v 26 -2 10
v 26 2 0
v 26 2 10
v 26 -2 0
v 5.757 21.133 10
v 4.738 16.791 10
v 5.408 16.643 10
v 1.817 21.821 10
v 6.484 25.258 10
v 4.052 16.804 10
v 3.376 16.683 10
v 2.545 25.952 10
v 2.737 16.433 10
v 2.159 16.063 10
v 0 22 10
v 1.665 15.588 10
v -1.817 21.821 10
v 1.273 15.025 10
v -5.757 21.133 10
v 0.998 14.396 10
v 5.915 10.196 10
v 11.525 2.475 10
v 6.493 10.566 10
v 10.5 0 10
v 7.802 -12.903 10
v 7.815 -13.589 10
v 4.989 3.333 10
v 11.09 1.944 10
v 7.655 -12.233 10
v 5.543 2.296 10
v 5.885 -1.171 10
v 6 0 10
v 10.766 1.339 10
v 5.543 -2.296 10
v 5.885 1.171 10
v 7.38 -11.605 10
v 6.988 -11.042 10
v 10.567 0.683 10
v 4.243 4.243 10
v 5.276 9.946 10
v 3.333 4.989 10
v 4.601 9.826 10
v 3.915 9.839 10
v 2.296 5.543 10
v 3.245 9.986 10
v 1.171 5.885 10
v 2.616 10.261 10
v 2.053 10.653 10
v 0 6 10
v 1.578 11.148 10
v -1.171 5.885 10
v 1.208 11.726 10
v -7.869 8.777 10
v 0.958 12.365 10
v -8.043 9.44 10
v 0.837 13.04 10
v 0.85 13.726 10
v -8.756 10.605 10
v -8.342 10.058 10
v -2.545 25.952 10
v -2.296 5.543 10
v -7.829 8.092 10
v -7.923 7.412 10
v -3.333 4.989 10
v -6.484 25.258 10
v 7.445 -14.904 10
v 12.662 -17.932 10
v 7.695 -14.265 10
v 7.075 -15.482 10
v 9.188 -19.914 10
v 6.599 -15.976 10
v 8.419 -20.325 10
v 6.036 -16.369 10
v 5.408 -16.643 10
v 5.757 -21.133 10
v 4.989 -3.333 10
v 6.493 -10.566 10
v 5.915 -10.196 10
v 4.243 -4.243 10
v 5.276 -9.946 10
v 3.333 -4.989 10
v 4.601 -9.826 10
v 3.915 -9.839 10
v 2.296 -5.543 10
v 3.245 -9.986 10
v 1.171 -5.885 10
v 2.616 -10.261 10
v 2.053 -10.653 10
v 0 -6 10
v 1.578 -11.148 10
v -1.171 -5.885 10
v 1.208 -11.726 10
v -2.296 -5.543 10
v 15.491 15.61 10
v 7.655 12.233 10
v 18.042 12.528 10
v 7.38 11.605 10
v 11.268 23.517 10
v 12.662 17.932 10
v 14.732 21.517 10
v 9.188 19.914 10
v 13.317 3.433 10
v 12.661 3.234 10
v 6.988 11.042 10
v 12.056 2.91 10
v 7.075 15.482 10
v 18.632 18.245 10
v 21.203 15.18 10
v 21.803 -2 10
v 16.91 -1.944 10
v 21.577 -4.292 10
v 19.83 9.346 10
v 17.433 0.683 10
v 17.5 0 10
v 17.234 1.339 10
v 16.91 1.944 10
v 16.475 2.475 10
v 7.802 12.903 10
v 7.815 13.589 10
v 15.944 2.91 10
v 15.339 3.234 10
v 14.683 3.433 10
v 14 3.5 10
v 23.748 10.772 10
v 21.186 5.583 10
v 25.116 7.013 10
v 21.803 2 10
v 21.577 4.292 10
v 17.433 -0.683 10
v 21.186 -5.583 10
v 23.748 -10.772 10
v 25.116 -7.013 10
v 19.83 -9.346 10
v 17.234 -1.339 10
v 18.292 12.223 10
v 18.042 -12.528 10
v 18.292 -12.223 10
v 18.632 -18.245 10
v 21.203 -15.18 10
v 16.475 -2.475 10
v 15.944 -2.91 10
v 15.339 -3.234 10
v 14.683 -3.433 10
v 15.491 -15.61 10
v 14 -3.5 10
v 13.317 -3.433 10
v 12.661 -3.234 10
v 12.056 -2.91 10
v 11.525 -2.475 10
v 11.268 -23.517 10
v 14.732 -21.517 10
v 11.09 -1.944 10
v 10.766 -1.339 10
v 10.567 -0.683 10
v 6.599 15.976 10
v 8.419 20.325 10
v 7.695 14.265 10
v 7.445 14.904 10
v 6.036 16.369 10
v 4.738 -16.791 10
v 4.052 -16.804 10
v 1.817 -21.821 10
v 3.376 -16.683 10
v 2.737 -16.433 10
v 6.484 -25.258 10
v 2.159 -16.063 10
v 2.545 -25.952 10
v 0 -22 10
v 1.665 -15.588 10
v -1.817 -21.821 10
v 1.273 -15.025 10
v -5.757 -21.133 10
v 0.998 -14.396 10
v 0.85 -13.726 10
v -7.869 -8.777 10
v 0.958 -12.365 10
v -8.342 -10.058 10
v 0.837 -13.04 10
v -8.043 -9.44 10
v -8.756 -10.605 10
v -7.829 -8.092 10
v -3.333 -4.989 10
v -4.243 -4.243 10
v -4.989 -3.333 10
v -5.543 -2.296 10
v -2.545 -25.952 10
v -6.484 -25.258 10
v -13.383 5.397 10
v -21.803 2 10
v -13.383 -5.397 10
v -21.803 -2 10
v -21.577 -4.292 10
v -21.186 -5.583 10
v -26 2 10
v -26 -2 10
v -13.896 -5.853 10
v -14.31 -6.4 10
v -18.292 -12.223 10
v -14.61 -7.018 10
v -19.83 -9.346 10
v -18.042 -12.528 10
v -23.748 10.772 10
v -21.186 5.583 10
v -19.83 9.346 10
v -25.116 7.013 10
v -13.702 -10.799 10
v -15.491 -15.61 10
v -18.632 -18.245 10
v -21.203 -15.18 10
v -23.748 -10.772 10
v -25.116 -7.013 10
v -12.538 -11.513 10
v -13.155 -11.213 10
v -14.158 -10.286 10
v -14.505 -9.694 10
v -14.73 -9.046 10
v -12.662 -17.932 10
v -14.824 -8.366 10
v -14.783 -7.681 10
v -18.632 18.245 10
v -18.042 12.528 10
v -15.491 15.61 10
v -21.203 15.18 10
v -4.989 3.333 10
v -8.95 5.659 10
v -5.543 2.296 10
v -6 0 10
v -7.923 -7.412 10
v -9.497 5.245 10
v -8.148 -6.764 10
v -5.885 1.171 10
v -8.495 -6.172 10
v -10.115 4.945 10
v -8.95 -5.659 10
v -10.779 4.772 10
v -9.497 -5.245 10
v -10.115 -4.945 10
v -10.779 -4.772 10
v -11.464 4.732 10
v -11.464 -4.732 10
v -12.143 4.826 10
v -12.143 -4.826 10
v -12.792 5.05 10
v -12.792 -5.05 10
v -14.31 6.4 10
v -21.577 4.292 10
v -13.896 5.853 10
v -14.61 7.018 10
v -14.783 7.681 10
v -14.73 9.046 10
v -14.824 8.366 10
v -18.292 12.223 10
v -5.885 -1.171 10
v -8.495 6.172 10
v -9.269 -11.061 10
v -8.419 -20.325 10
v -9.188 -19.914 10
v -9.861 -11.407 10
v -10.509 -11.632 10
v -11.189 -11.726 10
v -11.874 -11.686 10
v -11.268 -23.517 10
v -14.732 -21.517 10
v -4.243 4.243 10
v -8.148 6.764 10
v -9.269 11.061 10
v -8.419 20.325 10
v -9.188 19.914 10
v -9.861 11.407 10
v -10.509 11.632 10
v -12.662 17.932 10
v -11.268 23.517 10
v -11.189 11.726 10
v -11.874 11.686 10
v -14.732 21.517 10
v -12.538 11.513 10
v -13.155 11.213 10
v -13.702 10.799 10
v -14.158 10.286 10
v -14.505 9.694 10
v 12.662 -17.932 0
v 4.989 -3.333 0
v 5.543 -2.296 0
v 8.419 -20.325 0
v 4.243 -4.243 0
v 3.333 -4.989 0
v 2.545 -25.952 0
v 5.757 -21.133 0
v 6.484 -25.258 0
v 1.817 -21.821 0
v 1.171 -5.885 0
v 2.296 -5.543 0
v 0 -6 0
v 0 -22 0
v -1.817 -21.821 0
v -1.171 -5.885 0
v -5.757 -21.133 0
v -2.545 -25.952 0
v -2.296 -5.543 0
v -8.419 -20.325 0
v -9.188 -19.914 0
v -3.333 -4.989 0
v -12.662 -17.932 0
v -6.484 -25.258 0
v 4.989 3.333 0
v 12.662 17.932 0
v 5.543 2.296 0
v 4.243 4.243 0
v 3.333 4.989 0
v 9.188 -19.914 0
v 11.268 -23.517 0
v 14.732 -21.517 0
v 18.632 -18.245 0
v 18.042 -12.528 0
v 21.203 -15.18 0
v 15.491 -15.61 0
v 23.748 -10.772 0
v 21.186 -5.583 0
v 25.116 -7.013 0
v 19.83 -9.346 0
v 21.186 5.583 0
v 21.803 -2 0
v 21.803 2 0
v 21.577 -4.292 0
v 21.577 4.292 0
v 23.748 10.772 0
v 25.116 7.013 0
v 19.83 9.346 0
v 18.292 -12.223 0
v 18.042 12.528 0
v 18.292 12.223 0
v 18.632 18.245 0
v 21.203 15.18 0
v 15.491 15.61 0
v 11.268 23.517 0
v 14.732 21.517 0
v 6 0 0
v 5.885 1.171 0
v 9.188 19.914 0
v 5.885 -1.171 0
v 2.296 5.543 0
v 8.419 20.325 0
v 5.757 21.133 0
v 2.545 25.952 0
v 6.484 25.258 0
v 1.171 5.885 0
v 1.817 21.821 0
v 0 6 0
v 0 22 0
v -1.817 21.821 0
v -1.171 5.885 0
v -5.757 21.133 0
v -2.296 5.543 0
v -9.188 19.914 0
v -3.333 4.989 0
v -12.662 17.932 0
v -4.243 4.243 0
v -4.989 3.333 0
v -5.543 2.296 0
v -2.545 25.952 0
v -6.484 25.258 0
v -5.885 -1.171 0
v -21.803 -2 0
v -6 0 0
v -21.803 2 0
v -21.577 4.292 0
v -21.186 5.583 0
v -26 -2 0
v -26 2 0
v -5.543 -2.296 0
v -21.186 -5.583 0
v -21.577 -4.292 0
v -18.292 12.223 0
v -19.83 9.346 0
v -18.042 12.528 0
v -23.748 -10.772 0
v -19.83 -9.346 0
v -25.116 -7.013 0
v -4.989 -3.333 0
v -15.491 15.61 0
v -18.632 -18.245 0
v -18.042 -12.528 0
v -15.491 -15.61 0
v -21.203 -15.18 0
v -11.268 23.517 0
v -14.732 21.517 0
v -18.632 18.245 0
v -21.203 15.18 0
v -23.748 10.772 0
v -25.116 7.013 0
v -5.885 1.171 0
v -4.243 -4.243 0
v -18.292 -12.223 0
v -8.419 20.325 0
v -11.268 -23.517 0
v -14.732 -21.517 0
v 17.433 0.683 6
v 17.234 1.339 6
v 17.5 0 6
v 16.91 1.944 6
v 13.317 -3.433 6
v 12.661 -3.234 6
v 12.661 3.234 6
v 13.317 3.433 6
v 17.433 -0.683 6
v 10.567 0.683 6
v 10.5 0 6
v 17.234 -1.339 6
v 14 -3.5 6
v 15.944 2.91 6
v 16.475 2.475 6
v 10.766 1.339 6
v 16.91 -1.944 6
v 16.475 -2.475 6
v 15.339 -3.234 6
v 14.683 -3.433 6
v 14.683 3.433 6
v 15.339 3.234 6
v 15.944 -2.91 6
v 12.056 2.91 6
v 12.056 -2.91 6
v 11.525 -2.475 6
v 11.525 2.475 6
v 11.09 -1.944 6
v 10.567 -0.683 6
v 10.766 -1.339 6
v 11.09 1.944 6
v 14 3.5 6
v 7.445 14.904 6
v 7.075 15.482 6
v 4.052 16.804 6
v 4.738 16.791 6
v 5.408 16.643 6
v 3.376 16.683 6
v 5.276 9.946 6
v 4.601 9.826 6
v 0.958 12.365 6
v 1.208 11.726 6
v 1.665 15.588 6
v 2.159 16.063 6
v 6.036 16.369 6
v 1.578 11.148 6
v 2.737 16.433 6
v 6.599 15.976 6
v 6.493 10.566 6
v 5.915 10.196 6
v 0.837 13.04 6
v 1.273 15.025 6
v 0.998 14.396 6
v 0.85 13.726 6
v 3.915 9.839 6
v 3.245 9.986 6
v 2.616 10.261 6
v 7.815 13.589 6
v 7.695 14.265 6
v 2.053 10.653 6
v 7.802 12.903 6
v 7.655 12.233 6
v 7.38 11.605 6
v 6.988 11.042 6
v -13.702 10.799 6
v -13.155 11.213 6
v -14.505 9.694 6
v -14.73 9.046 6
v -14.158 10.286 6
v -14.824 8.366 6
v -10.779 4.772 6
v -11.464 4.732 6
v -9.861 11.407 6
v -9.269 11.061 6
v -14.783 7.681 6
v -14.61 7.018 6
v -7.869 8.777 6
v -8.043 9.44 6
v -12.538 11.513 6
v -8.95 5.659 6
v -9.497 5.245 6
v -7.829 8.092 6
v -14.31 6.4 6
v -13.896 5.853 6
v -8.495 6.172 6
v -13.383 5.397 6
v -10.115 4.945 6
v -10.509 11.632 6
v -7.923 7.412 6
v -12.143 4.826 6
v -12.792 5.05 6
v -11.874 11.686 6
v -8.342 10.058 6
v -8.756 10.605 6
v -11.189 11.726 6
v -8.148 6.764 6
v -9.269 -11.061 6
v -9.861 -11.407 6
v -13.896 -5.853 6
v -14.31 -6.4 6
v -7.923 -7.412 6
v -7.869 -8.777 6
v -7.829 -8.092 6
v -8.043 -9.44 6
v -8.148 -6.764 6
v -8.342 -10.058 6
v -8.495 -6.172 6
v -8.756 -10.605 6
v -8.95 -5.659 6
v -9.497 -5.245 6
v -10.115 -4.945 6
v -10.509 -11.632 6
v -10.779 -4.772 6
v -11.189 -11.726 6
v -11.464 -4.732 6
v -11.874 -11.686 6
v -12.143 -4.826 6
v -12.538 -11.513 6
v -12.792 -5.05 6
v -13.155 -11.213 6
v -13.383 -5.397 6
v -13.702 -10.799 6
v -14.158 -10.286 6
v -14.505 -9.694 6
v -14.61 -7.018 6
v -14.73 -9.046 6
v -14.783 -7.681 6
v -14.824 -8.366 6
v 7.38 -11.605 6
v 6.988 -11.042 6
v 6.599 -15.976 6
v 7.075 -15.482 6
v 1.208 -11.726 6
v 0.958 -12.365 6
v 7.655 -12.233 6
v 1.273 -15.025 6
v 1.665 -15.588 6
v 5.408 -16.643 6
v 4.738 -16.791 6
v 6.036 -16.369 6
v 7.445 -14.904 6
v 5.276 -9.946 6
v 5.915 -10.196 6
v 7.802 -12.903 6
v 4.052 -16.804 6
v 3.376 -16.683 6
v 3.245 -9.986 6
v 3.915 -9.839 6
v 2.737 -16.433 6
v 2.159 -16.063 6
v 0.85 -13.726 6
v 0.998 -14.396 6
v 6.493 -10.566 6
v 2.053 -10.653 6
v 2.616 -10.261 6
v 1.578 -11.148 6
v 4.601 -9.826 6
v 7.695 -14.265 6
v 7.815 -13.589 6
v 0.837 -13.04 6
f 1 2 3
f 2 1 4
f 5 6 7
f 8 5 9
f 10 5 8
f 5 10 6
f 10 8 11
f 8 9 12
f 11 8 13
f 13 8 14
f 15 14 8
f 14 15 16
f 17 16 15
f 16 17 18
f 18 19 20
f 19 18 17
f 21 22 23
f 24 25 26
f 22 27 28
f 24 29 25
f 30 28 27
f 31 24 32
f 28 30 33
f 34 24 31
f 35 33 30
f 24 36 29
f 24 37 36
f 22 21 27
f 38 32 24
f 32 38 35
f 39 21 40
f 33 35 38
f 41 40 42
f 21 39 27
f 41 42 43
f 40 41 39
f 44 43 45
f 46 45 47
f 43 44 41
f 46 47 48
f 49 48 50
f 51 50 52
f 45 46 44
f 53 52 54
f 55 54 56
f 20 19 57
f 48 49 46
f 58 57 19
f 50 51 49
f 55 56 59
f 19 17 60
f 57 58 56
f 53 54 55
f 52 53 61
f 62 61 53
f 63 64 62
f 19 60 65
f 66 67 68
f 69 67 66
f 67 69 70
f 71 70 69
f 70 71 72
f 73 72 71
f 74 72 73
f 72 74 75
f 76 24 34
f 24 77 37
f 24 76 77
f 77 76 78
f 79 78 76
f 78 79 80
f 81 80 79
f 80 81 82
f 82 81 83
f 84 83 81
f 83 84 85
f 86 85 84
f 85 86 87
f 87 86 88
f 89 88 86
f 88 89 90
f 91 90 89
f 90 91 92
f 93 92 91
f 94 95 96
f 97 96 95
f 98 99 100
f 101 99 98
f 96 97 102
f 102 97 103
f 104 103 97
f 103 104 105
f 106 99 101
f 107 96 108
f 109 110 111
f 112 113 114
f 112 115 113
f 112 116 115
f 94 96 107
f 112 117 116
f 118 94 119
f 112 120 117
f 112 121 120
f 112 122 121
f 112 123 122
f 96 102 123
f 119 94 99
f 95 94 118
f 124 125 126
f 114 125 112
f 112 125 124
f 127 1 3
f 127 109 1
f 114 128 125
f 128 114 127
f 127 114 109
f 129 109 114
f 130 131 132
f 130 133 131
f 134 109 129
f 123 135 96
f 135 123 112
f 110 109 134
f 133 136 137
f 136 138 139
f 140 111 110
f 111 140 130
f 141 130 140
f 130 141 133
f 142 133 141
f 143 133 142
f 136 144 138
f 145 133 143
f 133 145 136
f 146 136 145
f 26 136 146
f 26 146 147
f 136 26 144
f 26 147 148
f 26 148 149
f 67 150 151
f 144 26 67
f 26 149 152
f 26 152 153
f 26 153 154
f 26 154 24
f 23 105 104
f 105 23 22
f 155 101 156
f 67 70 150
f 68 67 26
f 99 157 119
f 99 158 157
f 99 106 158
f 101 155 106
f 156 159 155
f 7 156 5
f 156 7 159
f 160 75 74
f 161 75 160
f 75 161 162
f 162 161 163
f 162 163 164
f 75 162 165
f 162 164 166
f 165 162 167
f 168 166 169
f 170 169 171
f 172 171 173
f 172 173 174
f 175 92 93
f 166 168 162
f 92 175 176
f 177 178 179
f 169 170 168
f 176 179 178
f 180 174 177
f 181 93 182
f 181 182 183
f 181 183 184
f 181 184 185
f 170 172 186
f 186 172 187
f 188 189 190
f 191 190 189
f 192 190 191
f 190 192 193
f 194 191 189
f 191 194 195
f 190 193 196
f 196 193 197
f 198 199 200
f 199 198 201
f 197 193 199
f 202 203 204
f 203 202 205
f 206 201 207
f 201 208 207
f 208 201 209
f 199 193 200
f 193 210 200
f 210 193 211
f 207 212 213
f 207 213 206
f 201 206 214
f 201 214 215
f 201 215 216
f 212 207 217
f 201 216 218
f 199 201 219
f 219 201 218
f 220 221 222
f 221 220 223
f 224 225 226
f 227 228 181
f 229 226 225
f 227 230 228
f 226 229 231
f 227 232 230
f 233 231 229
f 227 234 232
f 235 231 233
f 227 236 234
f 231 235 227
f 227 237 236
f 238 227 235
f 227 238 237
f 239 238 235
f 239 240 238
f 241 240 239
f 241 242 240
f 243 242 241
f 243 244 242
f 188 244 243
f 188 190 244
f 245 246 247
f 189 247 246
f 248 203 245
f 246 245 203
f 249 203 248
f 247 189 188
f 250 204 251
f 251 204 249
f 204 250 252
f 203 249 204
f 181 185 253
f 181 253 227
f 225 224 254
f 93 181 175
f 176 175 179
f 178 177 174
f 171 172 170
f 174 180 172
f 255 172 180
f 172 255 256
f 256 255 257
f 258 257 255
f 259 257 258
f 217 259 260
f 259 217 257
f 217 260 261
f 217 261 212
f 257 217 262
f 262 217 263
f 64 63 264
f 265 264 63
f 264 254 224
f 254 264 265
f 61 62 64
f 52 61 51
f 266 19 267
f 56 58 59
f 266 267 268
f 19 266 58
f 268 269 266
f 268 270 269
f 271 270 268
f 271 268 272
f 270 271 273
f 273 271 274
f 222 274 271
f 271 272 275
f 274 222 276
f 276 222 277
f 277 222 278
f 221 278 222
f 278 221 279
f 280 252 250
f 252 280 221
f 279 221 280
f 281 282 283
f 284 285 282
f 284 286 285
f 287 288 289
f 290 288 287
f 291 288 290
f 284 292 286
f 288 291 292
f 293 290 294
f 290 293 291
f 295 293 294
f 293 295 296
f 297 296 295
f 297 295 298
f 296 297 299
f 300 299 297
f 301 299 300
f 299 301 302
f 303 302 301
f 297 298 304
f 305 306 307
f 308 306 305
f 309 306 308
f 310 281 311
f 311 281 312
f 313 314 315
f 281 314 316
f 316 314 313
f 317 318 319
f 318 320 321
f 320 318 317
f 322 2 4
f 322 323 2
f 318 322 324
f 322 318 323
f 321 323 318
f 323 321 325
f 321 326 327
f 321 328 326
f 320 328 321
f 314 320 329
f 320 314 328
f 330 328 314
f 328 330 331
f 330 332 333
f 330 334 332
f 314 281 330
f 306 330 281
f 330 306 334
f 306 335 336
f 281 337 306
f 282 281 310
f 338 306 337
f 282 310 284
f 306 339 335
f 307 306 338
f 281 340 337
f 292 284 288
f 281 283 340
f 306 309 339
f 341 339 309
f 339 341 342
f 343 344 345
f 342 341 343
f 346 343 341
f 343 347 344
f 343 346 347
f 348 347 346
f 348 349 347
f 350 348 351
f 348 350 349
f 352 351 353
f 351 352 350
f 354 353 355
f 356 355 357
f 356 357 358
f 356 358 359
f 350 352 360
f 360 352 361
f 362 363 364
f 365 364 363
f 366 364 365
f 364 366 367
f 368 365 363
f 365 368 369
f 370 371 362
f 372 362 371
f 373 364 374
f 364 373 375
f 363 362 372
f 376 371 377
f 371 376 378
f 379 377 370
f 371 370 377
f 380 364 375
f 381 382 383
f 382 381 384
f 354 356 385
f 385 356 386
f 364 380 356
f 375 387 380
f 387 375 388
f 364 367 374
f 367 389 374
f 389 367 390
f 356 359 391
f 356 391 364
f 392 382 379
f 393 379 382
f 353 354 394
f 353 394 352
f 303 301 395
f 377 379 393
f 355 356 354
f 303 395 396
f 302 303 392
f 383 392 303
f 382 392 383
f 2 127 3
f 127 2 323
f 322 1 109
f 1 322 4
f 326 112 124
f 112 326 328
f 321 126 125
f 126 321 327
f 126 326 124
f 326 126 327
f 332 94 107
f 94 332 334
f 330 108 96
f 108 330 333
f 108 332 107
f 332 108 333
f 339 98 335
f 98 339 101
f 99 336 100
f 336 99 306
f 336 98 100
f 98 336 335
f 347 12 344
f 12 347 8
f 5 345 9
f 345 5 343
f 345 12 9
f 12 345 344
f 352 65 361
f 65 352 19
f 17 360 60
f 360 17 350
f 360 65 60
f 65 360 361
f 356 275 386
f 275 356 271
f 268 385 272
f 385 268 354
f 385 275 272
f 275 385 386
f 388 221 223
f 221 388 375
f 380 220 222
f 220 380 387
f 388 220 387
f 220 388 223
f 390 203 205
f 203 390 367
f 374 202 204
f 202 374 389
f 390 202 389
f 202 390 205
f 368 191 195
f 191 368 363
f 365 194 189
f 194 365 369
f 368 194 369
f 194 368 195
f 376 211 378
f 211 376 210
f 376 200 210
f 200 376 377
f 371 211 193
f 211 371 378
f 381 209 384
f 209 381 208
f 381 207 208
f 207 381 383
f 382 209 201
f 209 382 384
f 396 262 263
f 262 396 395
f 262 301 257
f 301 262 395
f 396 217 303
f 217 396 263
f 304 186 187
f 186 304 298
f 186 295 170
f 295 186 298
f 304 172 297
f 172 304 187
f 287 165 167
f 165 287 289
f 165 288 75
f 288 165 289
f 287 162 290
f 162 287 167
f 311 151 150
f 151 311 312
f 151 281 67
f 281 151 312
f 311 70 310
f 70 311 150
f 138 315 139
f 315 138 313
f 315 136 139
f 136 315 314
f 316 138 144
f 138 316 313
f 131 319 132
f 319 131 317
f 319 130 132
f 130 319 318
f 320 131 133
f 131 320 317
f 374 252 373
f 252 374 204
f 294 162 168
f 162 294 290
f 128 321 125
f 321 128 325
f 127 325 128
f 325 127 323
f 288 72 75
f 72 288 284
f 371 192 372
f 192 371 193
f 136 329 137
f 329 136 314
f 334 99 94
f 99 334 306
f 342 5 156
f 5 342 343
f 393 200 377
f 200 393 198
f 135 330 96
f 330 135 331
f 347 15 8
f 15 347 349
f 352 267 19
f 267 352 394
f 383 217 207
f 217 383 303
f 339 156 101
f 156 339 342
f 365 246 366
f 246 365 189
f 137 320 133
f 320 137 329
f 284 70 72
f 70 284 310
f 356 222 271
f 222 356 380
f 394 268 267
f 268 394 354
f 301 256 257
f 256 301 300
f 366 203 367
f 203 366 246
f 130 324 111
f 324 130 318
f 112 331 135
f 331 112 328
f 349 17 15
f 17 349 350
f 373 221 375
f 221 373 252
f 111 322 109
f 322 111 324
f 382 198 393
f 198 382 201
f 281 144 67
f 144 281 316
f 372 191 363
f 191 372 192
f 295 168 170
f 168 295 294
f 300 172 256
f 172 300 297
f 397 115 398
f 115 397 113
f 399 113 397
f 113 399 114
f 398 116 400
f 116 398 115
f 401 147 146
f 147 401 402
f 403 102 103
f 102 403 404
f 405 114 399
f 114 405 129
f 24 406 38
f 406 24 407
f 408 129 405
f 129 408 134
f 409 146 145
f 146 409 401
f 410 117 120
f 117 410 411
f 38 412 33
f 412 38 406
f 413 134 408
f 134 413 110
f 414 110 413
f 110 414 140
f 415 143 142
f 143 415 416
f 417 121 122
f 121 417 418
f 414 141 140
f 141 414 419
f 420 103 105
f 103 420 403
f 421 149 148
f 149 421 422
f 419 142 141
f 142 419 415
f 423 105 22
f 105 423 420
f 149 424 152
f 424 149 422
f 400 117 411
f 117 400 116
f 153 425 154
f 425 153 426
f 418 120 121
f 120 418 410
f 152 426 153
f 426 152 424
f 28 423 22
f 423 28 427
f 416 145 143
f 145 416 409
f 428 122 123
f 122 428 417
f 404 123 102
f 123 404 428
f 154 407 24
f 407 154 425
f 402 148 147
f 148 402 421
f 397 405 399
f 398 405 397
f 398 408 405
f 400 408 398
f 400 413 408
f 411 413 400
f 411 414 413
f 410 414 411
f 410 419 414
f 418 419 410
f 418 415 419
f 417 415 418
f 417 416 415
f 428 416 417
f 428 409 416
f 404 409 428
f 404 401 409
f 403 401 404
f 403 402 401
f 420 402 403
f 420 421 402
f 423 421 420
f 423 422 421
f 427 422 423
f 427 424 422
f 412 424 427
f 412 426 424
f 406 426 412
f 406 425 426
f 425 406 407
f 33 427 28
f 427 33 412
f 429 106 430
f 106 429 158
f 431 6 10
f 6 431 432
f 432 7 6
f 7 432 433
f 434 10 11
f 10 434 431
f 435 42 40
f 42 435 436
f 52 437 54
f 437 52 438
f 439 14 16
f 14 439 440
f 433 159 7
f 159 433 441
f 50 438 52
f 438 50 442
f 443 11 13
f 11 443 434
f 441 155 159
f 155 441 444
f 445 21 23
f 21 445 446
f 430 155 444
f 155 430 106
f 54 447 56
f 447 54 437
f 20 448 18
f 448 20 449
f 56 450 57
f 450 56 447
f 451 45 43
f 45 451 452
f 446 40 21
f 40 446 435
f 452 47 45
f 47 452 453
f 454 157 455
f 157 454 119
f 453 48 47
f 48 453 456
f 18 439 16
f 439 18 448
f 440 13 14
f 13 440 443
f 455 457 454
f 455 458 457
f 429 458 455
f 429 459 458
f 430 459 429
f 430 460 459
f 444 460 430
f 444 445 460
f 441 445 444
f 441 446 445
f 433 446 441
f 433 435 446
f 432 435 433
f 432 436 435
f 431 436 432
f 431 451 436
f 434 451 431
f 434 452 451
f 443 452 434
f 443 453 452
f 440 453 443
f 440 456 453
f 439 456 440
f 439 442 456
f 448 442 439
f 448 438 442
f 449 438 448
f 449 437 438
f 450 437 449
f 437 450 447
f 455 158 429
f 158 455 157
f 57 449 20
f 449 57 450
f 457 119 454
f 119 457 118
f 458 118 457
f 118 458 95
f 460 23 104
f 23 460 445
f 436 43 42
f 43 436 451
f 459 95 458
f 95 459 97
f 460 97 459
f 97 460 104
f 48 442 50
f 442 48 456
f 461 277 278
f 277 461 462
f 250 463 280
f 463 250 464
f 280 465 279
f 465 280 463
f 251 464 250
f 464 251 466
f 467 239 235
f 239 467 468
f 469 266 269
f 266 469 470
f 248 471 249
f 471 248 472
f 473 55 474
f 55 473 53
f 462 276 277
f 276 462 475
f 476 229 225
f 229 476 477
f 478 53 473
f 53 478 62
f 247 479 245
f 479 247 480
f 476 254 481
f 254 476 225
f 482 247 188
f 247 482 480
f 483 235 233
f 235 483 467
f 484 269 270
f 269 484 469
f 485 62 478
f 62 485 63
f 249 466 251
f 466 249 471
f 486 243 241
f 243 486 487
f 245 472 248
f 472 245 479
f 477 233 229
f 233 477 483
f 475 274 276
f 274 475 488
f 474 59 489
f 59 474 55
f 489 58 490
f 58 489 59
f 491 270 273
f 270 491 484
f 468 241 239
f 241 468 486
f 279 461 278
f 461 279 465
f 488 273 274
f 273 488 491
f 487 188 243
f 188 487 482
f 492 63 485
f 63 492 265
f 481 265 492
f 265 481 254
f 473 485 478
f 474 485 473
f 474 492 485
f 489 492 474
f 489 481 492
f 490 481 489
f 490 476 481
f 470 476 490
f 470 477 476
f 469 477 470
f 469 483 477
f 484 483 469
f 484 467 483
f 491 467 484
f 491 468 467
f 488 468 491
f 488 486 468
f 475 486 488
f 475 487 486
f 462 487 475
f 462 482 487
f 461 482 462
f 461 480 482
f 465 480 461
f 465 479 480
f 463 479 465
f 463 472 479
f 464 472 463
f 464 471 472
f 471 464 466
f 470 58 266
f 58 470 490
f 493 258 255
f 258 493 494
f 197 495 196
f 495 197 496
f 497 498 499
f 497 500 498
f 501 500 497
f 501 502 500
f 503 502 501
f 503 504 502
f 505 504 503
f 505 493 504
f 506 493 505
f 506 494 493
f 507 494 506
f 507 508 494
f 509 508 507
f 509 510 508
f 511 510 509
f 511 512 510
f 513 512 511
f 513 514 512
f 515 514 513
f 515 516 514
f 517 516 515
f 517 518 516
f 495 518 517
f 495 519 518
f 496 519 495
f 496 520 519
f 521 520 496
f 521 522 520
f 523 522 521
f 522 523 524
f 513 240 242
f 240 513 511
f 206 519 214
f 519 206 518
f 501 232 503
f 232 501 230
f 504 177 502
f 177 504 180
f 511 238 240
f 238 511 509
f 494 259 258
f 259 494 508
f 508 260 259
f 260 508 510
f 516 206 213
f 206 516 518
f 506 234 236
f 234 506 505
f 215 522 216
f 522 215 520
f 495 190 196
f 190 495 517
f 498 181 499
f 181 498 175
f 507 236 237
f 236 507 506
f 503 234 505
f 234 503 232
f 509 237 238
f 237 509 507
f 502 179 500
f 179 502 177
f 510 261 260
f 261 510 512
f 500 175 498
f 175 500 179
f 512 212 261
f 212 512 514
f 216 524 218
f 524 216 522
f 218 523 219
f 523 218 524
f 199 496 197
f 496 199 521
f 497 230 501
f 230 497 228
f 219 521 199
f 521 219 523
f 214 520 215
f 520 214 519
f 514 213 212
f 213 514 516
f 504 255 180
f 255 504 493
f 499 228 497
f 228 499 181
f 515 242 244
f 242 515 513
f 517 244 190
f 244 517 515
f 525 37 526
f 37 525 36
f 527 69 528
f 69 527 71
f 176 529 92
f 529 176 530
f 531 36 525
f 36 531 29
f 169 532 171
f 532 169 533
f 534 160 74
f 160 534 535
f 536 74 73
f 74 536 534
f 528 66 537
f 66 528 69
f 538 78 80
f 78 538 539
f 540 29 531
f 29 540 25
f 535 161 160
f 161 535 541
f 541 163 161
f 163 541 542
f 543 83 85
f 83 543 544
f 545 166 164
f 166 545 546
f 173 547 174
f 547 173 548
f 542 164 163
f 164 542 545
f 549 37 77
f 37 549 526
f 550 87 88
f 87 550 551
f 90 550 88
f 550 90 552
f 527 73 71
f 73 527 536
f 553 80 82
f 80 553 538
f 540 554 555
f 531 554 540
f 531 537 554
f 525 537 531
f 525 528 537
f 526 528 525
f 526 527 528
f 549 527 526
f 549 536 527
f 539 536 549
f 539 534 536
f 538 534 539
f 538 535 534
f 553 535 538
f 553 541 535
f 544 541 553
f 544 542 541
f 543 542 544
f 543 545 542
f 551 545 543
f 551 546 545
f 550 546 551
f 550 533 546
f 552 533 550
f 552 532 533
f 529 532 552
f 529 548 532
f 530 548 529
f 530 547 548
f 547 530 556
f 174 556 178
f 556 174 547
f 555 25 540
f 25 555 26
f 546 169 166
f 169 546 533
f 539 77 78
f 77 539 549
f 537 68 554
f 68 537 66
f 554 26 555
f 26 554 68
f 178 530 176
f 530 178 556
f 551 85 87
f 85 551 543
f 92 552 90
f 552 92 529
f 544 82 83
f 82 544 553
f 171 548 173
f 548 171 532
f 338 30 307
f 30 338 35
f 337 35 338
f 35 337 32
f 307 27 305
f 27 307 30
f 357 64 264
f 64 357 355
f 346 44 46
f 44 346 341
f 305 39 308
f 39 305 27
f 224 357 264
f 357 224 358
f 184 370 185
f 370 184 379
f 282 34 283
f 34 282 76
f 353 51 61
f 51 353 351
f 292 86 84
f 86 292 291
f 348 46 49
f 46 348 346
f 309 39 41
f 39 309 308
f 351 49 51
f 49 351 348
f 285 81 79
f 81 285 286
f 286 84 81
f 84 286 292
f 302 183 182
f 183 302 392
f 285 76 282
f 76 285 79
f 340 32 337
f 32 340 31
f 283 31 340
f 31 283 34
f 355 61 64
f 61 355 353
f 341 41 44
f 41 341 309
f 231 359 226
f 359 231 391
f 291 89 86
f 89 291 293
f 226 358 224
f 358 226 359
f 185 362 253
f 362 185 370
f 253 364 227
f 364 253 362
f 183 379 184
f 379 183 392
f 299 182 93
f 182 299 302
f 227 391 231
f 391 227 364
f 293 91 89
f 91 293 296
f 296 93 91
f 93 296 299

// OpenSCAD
$fn = 32;

// ----------------------------------------------------------------------
// Spur blank: lightened gear blank
// ----------------------------------------------------------------------

// --- parameters (mm) ---
disc_r = 22;              // blank root radius
disc_t = 10;              // blank thickness
n_teeth = 18;             // stub tooth count
tooth_w = 4;              // tooth width at the root
tooth_h = 4;              // tooth height above the root
bore_r = 6;               // central bore radius
ring_r = 14;              // lightening pocket ring radius
pocket_r = 3.5;           // lightening pocket radius

out_r = disc_r + tooth_h;  // tip radius
bbox_x = 52.0;  // measured width over the teeth
bbox_y = 51.9;  // measured depth over the teeth

difference() {
union() {
  cylinder(r = disc_r, h = disc_t);
  for (i = [0 : n_teeth - 1])
    rotate([0, 0, i * 360 / n_teeth])
      translate([disc_r - 1, -tooth_w / 2, 0])
        cube([tooth_h + 1, tooth_w, disc_t]);
}
  translate([0, 0, -1]) cylinder(r = bore_r, h = disc_t + 2);
  for (i = [0 : 5])
    rotate([0, 0, i * 72])
      translate([ring_r, 0, disc_t - 4])
        cylinder(r = pocket_r, h = 5);
}
